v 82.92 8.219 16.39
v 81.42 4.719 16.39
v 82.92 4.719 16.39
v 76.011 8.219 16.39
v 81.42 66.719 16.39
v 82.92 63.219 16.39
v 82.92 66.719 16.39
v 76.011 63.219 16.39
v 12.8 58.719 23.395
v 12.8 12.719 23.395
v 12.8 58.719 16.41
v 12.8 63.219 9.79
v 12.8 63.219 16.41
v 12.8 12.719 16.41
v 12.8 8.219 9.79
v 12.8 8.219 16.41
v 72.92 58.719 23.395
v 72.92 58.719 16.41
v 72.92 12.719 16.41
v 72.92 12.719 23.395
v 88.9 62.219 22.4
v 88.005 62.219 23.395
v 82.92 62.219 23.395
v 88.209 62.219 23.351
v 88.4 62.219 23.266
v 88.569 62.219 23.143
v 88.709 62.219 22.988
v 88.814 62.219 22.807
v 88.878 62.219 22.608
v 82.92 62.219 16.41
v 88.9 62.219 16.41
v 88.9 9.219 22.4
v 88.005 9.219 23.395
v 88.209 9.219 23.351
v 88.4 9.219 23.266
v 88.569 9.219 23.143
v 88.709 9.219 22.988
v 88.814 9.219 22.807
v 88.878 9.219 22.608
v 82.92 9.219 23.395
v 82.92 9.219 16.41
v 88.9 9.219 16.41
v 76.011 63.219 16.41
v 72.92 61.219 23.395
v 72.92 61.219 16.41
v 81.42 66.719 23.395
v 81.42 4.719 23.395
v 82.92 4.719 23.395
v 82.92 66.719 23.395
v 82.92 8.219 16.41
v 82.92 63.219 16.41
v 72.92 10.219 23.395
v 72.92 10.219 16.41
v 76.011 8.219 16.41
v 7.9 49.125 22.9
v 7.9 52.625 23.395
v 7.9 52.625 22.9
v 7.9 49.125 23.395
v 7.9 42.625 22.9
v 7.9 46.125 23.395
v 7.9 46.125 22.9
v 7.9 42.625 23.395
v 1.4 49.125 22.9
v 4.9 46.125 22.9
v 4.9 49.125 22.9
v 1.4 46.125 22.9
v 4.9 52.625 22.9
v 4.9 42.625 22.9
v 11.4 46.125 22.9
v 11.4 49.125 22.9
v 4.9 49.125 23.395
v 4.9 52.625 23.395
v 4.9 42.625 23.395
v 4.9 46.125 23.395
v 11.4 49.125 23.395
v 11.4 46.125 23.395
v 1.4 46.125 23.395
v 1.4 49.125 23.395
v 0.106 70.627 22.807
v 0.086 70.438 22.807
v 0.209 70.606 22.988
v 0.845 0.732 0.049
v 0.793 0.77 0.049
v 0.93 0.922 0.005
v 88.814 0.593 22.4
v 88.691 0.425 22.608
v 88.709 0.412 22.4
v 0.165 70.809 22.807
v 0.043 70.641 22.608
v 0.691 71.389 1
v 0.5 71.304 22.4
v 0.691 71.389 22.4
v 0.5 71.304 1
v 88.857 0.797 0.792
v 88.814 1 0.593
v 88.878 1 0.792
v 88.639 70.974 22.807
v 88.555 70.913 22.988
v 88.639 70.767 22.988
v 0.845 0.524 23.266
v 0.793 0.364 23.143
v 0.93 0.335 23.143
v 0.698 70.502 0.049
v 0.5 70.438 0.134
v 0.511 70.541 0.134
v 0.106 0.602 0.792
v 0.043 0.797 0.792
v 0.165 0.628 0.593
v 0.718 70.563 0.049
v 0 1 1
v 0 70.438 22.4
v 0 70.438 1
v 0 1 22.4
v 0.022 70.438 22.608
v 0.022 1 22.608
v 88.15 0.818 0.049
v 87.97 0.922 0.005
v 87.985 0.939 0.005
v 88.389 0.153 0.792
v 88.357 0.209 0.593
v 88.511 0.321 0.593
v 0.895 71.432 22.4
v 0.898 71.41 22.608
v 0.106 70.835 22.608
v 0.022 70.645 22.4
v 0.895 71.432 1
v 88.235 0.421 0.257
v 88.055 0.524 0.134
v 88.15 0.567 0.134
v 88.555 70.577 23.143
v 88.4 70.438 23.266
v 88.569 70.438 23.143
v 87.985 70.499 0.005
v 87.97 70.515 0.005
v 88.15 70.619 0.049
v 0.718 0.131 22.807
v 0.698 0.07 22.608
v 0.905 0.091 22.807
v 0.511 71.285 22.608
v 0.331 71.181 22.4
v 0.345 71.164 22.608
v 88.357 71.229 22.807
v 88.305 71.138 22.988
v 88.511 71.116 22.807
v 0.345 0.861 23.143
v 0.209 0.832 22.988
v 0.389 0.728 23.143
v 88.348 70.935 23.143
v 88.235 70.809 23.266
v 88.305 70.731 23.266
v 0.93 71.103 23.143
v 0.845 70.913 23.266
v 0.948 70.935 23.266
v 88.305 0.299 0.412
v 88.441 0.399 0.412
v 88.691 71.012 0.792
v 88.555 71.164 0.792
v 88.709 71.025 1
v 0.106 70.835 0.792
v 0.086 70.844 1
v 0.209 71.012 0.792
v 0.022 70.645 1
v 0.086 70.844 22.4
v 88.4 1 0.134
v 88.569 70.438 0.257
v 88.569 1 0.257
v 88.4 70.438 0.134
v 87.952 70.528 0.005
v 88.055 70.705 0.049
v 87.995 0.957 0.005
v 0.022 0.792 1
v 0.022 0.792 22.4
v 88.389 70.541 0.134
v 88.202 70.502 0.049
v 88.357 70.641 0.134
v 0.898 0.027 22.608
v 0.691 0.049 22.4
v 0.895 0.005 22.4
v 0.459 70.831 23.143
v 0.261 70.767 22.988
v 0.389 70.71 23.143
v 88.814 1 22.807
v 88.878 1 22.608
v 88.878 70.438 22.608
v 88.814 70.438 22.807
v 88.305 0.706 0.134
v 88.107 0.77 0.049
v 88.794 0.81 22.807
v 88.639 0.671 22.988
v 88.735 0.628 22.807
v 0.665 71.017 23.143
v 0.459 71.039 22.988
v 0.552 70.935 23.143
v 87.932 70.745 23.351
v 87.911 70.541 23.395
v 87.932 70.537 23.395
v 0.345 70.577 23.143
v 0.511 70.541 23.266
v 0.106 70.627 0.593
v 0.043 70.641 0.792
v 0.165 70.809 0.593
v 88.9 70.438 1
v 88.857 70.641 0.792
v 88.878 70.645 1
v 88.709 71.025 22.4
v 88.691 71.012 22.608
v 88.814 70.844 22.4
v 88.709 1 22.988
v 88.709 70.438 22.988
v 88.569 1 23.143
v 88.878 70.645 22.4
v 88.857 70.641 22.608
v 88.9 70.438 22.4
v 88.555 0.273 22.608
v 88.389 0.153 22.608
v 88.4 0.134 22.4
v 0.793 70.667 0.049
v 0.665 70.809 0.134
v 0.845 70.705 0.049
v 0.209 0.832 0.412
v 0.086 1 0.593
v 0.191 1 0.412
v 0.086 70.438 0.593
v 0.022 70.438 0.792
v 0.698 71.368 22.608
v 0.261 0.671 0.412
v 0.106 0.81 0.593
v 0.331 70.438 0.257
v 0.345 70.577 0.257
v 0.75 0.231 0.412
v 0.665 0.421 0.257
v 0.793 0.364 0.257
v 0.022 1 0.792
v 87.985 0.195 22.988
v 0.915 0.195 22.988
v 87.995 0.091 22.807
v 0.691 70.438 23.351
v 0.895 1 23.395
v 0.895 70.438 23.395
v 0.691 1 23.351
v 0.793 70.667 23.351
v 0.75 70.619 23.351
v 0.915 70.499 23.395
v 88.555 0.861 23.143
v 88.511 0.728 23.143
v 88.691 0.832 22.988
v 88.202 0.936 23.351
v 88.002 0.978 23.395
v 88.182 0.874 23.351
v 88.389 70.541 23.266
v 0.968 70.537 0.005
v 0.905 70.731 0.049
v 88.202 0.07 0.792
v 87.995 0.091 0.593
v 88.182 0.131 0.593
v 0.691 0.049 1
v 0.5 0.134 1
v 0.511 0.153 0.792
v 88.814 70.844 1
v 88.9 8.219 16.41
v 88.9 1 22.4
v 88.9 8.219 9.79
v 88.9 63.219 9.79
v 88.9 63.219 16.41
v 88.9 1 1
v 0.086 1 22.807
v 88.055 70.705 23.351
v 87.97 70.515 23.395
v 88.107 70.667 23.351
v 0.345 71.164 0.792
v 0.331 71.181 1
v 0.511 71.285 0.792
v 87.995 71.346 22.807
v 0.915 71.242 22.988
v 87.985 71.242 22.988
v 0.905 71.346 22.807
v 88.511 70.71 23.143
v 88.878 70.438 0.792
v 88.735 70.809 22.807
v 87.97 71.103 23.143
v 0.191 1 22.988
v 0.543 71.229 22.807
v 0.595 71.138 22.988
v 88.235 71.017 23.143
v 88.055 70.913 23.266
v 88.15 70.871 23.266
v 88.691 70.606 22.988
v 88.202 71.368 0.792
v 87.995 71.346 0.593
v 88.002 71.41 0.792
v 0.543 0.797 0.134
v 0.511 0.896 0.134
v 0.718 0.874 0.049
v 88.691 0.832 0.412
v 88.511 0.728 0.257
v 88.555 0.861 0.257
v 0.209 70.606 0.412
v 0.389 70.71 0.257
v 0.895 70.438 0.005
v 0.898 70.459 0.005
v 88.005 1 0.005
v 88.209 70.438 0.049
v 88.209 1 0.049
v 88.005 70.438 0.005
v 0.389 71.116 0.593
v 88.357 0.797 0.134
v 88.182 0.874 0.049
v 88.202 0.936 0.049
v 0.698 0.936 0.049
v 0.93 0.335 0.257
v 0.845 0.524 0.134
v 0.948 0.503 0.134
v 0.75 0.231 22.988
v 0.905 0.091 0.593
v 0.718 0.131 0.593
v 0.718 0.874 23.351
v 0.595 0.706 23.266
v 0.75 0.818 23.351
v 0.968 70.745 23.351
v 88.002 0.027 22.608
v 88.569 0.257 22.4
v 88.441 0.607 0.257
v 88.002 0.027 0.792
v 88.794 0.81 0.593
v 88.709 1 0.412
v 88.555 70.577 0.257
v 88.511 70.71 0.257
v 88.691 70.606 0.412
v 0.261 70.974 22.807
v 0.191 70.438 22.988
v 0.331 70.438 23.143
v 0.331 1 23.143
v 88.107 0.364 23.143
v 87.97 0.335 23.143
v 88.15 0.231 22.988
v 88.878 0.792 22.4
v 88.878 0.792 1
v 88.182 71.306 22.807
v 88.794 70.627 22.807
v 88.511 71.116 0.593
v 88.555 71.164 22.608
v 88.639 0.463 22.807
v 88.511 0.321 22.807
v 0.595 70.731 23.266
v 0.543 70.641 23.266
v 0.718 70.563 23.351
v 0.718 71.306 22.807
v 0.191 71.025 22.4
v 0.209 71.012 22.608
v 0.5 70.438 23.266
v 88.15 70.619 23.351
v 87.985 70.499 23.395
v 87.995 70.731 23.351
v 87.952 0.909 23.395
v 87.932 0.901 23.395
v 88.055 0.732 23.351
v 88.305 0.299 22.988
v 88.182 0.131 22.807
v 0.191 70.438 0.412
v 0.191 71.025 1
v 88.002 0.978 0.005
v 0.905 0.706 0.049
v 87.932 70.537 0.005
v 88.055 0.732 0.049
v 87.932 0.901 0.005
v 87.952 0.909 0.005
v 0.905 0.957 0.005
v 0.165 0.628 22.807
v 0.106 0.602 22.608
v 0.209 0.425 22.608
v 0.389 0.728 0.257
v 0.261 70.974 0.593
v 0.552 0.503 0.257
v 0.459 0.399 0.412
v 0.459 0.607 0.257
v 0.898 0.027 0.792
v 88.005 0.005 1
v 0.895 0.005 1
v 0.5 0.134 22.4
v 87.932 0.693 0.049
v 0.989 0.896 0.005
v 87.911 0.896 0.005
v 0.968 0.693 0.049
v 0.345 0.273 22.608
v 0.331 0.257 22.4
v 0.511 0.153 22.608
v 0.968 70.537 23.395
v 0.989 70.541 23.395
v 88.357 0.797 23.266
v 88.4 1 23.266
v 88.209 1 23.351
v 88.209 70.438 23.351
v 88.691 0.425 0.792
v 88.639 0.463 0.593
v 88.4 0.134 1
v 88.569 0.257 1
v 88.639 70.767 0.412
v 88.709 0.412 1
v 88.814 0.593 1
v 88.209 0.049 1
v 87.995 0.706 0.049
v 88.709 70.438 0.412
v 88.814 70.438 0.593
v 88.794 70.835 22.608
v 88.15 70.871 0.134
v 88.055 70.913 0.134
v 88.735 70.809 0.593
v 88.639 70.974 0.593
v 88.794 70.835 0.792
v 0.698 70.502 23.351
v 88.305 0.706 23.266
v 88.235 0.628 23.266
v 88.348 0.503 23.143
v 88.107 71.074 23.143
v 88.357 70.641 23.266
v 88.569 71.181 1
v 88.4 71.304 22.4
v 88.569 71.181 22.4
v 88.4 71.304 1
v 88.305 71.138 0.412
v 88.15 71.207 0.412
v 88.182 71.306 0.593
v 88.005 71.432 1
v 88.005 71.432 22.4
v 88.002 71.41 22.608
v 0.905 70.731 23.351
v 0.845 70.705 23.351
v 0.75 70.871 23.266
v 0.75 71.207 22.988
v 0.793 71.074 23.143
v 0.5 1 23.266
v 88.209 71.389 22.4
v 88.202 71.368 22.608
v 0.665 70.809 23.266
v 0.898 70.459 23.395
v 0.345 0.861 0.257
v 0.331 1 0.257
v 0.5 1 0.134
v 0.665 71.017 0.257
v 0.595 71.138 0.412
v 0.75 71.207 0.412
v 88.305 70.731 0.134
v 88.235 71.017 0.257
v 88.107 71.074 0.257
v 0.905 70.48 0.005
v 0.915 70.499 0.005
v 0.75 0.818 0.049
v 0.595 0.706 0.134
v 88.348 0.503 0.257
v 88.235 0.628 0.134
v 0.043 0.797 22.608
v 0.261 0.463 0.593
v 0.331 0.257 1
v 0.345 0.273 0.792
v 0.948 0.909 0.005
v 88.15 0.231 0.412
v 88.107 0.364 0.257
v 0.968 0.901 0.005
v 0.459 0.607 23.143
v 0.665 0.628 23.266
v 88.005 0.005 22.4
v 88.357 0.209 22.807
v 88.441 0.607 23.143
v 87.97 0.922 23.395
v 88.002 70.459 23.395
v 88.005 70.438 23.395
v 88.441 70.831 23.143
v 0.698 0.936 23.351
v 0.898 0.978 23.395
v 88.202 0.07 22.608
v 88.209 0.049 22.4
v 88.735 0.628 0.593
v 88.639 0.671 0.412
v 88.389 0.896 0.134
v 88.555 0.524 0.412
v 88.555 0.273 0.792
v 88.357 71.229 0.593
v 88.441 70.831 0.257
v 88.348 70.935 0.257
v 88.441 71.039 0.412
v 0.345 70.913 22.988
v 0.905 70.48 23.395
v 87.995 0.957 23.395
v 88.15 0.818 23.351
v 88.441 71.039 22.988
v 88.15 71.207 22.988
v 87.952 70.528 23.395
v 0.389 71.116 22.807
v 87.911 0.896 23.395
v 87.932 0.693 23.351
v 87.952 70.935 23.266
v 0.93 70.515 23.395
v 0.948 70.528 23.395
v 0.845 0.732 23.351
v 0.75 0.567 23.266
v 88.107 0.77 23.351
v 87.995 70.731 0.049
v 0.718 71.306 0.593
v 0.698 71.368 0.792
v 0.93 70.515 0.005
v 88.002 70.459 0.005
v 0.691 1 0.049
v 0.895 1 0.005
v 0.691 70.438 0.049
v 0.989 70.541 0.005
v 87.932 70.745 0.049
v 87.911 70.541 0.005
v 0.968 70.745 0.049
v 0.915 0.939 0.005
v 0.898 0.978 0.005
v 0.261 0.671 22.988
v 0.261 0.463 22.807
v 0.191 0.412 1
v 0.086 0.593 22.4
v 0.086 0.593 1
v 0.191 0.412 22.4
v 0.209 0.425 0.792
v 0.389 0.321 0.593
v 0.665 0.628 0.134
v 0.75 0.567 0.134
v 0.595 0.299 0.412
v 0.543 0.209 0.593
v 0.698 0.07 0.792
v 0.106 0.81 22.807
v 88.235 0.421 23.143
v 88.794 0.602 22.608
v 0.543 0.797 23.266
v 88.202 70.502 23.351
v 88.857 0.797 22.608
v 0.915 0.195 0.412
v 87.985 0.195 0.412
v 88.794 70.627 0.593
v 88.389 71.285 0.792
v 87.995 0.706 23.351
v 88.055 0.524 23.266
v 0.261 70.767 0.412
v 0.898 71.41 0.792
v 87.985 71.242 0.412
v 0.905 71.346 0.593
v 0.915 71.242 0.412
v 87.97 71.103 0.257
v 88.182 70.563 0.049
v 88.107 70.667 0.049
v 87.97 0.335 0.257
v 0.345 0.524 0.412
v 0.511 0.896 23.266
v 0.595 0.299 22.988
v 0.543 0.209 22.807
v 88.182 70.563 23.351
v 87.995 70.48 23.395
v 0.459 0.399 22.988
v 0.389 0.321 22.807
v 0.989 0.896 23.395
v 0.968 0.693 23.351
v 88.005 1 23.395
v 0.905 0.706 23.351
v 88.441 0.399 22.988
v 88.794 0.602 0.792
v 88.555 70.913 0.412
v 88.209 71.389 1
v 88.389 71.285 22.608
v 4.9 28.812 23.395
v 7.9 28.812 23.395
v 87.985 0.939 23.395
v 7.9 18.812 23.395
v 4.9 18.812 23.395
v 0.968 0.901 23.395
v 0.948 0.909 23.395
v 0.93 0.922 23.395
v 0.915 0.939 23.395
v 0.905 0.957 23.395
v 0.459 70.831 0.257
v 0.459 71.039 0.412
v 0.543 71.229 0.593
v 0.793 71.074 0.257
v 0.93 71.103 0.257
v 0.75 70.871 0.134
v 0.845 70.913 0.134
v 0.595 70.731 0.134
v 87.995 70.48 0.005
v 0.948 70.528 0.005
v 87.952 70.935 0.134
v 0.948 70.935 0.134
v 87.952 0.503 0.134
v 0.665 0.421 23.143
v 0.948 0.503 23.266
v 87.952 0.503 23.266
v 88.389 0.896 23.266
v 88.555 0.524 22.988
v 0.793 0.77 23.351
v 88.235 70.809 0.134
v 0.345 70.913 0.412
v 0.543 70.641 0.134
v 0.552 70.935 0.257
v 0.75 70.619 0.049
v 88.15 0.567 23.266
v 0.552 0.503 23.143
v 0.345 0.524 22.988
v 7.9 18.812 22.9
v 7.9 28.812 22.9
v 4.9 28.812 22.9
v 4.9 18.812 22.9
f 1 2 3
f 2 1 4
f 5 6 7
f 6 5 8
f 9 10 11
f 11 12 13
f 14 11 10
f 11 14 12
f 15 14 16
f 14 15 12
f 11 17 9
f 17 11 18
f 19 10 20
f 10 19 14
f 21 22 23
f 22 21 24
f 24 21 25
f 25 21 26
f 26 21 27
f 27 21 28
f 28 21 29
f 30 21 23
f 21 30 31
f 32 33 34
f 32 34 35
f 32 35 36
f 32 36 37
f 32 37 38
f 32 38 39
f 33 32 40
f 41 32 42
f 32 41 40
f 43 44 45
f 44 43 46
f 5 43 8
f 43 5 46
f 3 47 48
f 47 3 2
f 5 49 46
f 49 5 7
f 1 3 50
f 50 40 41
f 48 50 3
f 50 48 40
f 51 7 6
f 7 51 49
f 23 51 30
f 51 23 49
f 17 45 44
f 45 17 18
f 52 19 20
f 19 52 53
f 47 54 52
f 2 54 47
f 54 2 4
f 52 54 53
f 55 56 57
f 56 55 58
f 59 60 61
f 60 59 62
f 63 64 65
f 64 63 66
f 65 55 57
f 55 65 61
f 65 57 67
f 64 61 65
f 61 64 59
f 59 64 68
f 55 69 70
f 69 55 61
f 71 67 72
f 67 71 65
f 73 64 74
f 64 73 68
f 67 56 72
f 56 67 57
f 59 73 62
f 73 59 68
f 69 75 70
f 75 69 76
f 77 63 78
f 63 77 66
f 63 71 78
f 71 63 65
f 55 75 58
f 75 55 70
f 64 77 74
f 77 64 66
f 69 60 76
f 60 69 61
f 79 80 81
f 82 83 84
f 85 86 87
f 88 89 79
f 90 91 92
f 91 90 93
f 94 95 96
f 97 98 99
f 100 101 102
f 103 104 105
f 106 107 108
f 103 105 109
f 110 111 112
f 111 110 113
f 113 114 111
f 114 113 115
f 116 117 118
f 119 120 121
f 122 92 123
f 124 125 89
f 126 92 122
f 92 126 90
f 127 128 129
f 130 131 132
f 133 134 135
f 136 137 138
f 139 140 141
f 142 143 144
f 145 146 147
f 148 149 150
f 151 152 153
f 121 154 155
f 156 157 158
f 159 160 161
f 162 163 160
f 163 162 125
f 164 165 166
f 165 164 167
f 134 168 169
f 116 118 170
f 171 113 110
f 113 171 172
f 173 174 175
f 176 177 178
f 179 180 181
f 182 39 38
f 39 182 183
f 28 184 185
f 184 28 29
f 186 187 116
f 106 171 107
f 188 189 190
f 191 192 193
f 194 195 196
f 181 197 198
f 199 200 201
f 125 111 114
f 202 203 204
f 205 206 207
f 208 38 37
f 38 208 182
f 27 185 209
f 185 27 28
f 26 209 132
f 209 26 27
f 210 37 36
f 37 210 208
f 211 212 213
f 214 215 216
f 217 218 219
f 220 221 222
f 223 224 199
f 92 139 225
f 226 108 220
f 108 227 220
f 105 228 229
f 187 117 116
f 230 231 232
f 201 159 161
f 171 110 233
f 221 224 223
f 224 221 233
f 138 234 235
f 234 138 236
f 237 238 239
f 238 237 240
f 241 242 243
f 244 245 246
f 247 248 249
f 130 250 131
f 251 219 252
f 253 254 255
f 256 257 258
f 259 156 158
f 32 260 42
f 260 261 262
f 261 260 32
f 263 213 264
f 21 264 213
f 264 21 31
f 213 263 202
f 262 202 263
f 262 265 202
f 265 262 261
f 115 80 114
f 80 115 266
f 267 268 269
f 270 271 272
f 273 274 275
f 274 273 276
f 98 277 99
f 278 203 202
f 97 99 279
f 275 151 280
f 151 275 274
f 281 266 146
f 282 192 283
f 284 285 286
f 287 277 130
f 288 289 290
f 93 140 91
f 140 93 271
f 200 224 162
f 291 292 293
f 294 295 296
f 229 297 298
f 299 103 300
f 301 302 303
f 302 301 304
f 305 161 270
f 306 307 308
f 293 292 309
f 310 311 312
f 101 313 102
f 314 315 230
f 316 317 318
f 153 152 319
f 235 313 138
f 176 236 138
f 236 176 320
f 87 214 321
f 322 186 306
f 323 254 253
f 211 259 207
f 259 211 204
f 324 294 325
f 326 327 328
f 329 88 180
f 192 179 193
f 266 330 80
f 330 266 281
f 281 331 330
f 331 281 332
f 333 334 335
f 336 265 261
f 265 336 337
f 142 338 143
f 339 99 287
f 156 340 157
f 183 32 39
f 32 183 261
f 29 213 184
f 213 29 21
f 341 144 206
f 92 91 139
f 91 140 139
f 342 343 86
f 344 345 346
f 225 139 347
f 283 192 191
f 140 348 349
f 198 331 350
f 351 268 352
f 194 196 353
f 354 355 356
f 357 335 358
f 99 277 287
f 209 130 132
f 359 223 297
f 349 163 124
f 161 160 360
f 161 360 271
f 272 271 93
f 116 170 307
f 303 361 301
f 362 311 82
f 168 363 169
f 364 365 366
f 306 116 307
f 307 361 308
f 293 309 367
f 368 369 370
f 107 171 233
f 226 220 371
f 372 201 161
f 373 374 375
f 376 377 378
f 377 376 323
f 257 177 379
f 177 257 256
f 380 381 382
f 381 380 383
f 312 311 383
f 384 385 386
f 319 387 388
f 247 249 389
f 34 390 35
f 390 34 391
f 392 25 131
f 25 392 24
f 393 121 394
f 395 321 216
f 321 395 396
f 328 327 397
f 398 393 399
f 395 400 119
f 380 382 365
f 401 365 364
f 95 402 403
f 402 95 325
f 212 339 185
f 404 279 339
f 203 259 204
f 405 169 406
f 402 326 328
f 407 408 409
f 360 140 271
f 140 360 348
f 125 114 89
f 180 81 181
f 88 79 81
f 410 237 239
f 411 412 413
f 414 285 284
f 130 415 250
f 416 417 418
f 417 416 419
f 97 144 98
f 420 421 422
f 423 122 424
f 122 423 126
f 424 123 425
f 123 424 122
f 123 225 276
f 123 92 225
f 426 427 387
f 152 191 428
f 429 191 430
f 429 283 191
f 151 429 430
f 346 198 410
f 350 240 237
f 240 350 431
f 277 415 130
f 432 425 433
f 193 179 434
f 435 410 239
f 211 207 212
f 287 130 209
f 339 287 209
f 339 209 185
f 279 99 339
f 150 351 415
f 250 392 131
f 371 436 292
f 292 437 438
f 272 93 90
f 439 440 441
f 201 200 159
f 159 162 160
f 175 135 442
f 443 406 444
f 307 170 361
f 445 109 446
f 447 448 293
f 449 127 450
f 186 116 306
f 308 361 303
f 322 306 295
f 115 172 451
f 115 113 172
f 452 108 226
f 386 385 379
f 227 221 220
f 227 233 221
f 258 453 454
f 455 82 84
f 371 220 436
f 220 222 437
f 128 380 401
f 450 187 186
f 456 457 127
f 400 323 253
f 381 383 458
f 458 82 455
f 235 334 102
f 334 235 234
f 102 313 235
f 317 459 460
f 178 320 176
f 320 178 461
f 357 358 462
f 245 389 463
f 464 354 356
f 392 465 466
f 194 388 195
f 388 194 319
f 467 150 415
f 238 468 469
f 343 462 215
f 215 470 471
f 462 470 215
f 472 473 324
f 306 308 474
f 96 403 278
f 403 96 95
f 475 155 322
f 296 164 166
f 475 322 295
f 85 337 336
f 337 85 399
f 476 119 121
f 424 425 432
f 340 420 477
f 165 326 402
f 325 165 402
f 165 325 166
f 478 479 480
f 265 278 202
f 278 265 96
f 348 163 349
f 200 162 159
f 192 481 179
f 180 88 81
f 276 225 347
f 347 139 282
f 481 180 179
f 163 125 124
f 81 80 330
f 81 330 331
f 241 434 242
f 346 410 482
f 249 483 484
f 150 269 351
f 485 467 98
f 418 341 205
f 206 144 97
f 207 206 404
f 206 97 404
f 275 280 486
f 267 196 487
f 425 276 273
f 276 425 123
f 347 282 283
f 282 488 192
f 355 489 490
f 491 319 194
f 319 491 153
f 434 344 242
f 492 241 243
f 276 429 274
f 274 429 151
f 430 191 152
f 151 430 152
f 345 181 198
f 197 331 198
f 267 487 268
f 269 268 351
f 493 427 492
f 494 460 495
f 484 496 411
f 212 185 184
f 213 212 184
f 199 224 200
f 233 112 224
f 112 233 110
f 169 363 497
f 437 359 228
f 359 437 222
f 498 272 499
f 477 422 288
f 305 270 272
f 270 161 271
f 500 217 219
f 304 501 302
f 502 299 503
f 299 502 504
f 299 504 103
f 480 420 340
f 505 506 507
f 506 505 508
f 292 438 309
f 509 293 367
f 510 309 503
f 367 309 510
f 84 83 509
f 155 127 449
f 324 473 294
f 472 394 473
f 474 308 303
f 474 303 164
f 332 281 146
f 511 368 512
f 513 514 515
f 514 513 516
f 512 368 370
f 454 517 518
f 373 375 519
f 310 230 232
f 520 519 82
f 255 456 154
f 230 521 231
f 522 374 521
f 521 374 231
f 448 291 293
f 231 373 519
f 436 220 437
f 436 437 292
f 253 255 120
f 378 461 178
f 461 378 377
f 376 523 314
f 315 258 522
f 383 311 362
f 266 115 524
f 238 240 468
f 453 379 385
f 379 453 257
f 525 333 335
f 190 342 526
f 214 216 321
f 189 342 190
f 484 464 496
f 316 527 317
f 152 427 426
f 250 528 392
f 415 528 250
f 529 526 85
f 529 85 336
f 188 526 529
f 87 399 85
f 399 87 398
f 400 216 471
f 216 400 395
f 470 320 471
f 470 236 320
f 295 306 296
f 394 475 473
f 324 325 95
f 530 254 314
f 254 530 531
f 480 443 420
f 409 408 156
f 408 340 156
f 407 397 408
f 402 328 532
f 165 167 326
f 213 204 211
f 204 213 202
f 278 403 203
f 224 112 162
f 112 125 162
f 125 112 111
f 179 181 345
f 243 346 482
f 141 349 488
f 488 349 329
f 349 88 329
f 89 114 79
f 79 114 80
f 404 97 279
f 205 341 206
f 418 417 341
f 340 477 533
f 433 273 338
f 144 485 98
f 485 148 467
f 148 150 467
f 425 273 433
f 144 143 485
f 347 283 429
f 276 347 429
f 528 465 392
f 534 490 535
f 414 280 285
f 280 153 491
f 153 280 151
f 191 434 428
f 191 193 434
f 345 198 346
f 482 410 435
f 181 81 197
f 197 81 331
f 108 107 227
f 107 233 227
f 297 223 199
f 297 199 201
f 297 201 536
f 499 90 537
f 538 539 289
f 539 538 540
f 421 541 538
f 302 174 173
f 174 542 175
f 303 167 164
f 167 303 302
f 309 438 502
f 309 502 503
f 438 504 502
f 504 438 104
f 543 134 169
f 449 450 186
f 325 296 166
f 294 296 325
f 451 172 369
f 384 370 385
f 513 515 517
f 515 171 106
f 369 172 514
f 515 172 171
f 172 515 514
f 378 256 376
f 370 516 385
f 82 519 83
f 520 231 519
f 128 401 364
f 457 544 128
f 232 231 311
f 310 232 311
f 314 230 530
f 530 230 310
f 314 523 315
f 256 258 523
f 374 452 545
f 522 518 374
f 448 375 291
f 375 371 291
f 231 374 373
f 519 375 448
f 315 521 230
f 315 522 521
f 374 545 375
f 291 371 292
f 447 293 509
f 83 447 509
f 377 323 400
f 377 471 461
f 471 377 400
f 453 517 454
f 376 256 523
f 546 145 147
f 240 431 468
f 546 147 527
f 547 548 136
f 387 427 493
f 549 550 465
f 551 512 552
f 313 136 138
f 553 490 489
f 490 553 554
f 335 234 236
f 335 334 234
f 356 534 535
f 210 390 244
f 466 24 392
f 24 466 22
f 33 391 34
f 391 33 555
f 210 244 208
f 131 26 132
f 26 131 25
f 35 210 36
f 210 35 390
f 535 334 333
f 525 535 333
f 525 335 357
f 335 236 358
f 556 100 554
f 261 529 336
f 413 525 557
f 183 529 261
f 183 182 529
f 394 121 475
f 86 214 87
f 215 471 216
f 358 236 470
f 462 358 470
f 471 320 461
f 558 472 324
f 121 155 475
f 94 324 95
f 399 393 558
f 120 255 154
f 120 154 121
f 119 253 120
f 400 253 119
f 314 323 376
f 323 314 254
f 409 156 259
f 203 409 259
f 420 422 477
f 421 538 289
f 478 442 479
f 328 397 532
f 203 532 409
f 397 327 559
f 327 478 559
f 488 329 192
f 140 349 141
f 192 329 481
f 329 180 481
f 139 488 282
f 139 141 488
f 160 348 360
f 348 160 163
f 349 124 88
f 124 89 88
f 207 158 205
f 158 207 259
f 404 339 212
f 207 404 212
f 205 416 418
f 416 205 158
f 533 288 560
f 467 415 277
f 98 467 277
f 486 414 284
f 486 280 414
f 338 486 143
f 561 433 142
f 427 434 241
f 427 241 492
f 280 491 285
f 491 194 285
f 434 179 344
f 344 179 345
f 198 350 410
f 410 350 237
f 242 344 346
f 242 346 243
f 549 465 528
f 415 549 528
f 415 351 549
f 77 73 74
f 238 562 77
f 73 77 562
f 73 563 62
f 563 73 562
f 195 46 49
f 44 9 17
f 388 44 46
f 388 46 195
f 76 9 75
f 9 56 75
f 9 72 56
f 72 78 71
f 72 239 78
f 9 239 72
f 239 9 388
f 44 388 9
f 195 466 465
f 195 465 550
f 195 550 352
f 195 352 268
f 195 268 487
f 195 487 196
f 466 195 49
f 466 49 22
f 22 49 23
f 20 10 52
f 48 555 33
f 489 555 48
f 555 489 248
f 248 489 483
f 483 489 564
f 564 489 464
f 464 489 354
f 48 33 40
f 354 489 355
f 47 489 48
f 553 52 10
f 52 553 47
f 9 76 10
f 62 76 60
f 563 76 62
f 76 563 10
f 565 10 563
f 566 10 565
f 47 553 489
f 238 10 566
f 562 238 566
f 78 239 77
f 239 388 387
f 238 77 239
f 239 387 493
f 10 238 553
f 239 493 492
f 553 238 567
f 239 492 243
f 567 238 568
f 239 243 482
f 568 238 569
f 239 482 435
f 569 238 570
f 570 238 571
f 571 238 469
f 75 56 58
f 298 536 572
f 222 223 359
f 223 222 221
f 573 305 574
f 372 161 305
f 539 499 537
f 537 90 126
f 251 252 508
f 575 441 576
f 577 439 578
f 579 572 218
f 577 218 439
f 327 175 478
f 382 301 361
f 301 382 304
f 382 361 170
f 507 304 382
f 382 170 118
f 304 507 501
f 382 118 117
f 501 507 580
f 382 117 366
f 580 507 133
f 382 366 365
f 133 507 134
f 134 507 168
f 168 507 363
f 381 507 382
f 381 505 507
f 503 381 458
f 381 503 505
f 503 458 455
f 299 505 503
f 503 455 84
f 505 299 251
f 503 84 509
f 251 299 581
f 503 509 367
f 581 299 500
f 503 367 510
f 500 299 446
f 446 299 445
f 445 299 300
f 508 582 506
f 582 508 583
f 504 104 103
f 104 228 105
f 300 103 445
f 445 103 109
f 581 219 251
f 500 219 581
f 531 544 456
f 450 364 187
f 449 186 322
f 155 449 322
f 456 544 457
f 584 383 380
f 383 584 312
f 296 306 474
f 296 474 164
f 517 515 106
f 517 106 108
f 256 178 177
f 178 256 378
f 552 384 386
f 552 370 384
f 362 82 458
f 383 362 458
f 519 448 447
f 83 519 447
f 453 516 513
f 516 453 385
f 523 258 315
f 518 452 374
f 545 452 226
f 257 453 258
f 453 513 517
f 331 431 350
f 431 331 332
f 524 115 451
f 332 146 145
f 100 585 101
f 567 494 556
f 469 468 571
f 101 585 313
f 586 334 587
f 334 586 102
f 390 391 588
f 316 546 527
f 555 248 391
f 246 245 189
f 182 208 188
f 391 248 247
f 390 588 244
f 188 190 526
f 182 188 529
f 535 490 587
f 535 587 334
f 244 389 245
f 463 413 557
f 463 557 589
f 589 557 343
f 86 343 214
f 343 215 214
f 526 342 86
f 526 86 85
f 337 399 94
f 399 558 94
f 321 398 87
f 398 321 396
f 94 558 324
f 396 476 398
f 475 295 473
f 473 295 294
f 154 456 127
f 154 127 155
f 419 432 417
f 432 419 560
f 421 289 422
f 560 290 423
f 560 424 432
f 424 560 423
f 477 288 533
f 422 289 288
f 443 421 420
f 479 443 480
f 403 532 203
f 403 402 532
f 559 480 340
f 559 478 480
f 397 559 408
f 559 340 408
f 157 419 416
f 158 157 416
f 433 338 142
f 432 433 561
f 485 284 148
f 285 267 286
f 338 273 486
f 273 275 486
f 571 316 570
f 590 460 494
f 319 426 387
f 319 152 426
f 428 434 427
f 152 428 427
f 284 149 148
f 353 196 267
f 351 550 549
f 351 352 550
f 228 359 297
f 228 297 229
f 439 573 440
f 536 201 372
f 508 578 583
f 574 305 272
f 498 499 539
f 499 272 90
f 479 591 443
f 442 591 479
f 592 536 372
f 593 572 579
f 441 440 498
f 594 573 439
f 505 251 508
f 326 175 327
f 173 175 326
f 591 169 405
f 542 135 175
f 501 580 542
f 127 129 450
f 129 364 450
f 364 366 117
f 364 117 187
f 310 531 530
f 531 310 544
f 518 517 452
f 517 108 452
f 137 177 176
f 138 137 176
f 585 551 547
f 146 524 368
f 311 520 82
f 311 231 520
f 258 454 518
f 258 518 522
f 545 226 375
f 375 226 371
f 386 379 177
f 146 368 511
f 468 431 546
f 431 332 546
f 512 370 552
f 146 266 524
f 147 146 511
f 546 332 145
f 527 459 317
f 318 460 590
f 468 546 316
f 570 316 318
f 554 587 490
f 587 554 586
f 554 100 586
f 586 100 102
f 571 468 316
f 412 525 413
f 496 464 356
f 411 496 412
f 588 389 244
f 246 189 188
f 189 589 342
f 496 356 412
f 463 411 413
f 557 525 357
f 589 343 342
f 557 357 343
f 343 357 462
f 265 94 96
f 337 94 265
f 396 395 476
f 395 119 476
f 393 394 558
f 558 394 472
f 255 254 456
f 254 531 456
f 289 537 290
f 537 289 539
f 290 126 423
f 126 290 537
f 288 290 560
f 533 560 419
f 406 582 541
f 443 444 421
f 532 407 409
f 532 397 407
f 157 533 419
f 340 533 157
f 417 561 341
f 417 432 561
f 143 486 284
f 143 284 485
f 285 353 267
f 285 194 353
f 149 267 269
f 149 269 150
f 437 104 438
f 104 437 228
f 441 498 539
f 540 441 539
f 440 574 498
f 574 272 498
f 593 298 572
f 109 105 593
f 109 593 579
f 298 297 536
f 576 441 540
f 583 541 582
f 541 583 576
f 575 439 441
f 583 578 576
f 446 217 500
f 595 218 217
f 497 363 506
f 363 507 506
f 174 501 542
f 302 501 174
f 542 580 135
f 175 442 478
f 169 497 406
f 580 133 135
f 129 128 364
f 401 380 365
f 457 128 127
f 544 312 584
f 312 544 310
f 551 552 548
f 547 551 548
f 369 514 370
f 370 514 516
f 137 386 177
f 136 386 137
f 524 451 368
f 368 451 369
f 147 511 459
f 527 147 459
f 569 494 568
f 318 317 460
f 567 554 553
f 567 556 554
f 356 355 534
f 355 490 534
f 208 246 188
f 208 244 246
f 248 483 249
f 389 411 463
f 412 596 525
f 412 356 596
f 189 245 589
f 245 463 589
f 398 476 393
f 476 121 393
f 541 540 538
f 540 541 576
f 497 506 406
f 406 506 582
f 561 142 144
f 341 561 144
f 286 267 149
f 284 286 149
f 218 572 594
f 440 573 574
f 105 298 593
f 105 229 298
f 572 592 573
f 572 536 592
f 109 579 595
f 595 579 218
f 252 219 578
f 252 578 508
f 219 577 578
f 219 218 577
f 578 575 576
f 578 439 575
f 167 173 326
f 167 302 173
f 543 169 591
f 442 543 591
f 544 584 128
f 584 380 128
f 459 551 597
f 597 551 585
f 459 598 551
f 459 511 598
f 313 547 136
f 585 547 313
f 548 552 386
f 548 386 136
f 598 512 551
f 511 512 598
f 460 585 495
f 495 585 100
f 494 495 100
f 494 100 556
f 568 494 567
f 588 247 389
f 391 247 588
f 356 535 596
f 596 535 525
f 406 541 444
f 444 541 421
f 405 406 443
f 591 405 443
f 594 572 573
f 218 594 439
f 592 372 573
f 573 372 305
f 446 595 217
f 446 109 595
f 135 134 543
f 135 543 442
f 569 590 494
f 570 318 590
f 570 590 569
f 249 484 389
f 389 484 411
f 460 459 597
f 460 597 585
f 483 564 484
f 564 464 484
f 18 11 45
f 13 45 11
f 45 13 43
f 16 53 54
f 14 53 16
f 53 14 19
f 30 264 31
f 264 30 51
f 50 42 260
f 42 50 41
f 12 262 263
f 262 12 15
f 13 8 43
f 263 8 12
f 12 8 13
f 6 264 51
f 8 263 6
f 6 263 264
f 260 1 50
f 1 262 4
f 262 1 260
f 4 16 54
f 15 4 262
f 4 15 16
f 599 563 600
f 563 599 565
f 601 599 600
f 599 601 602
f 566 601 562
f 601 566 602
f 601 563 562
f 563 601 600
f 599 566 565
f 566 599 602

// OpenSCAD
// file: support/roundedcube.scad
// More information: https://danielupshaw.com/openscad-rounded-corners/
// License 2020-08-13: The only two people in this world who are allowed to use roundedcube.scad are named Dan Upshaw and Dan Fandrich

// Set to 0.01 for higher definition curves (renders slower)
$fs = 0.15;

module roundedcube(size = [1, 1, 1], center = false, radius = 0.5, apply_to = "all") {
	// If single value, convert to [x, y, z] vector
	size = (size[0] == undef) ? [size, size, size] : size;

	translate_min = radius;
	translate_xmax = size[0] - radius;
	translate_ymax = size[1] - radius;
	translate_zmax = size[2] - radius;

	diameter = radius * 2;

	obj_translate = (center == false) ?
		[0, 0, 0] : [
			-(size[0] / 2),
			-(size[1] / 2),
			-(size[2] / 2)
		];

	translate(v = obj_translate) {
		hull() {
			for (translate_x = [translate_min, translate_xmax]) {
				x_at = (translate_x == translate_min) ? "min" : "max";
				for (translate_y = [translate_min, translate_ymax]) {
					y_at = (translate_y == translate_min) ? "min" : "max";
					for (translate_z = [translate_min, translate_zmax]) {
						z_at = (translate_z == translate_min) ? "min" : "max";

						translate(v = [translate_x, translate_y, translate_z])
						if (
							(apply_to == "all") ||
							(apply_to == "xmin" && x_at == "min") || (apply_to == "xmax" && x_at == "max") ||
							(apply_to == "ymin" && y_at == "min") || (apply_to == "ymax" && y_at == "max") ||
							(apply_to == "zmin" && z_at == "min") || (apply_to == "zmax" && z_at == "max")
						) {
							sphere(r = radius);
						} else {
							rotate =
								(apply_to == "xmin" || apply_to == "xmax" || apply_to == "x") ? [0, 90, 0] : (
								(apply_to == "ymin" || apply_to == "ymax" || apply_to == "y") ? [90, 90, 0] :
								[0, 0, 0]
							);
							rotate(a = rotate)
							cylinder(h = diameter, r = radius, center = true);
						}
					}
				}
			}
		}
	}
}
// file: support/linepath.scad
module line(start, end, thickness = 1) {
  hull() {
    translate(start) circle(thickness);
    translate(end) circle(thickness);
  }
}

module path(line_points, thickness = 1) {
  for (i=[0:len(line_points)-1]) {
    if (i > 0) {
      line(line_points[i-1], line_points[i], thickness);
    }
  }
}

// line([40, 10, 0], [70, 70, 0])
// path([40, 10, 0], [70, 70, 0], [100, 100, 0])
// path can take multiple arguments- including the return of PolyRound (Only supports 2d lines)
// main file
include <support/linepath.scad>
include <support/roundedcube.scad>
function in_to_mm(in) = in * 25.4;

rerr = 0.01;
rerr2 = rerr*2;

w = in_to_mm(3.5); // = 88.9
d = in_to_mm(2 + 13/16); // = 71.4375
h = 23.4;

l1h = 9.8;
l2h = 6.6;
l3h = 7;

l2d = 55;
l3d = 46;

back = 12.8;

// % cube([w, d, h]);

module layer1() {
  cube([w, d, l1h]);
}

module layer2_slot() {
  translate([back, (d - l2d)/2, l1h-rerr]) {
    cube([w, l2d, l2h + rerr2]);

  }
//   translate([0, 0, l1h]){
//     difference() {
//       cube([w, d, l2h]);
//
//       wall_d = 8;
//       translate([back, wall_d, -rerr])
//       cube([w, d - wall_d*2, l2h + rerr2]);
//     }
//   }
}

module layer3_slot() {
  slide_d = (d - l3d)/2;

  translate([0, 0, l1h + l2h - rerr]) {
    translate([back, slide_d, 0]) {
      cube([w, l3d, l3h + rerr2]);
    }

    clip_d = 53;
    clip_w = 6;
    translate([w - clip_w + rerr, (d - clip_d)/2, -rerr])
    cube([clip_w, clip_d, l3h + rerr2]);

    snap_ex_d = 62;
    snap_cl_d = 53;
    snap_pt_w = 1.5;
    snap_w = 10;
    snap_tri_d = 5.5;

    translate([w-clip_w+rerr2, (d - snap_ex_d)/2, 0])
    linear_extrude(l3h + rerr2)
    mirror([1, 0, 0])
    polygon([
      [0, 0],
      [snap_pt_w, 0],
      [snap_w, snap_tri_d],
      [snap_w, snap_ex_d - snap_tri_d],
      [snap_pt_w, snap_ex_d],
      [0, snap_ex_d],
      [0, 0],
    ]);
  }
//   translate([0, 0, l1h + l2h]){
//     difference() {
//       cube([w, d, l3h]);
//
//       slide = 12.6;
//       translate([back, slide, -rerr])
//       cube([w - back + rerr, d - slide*2, l3h + rerr2]);
//
// -----
//       clip_d = 9;
//       clip_w = 5.5;
//       translate([w - clip_w + rerr, clip_d, -rerr])
//       cube([clip_w, d - clip_d*2, l3h + rerr2]);
//
//       t_w = 10.3213371;
//       t_h = 4.6;
//       translate([w - t_w - clip_w + rerr2, d - slide - rerr, -rerr ])
//       linear_extrude(l3h + rerr2)
//       polygon([[0,0], [t_w, 0], [t_w, t_h]]);
//
//       translate([w - t_w - clip_w + rerr2, slide+rerr, -rerr ])
//       linear_extrude(l3h + rerr2)
//       polygon([[0,0], [t_w, -t_h], [t_w, 0]]);
//     }
//   }
}

difference() {
  roundedcube([w, d, h], radius=1);

  layer2_slot();
  layer3_slot();
  
  color("red")
  translate([back * (1/2), d * (2/3), h]) {
    cube([3, 10, 1], center=true);
    cube([10, 3, 1], center=true);
  }

  color("black")
  translate([back * (1/2), d * (1/3), h]) {
    cube([3, 10, 1], center=true);
  }
}
// layer1();
// layer2();
// difference() {
//   layer3();
//
// }
//
